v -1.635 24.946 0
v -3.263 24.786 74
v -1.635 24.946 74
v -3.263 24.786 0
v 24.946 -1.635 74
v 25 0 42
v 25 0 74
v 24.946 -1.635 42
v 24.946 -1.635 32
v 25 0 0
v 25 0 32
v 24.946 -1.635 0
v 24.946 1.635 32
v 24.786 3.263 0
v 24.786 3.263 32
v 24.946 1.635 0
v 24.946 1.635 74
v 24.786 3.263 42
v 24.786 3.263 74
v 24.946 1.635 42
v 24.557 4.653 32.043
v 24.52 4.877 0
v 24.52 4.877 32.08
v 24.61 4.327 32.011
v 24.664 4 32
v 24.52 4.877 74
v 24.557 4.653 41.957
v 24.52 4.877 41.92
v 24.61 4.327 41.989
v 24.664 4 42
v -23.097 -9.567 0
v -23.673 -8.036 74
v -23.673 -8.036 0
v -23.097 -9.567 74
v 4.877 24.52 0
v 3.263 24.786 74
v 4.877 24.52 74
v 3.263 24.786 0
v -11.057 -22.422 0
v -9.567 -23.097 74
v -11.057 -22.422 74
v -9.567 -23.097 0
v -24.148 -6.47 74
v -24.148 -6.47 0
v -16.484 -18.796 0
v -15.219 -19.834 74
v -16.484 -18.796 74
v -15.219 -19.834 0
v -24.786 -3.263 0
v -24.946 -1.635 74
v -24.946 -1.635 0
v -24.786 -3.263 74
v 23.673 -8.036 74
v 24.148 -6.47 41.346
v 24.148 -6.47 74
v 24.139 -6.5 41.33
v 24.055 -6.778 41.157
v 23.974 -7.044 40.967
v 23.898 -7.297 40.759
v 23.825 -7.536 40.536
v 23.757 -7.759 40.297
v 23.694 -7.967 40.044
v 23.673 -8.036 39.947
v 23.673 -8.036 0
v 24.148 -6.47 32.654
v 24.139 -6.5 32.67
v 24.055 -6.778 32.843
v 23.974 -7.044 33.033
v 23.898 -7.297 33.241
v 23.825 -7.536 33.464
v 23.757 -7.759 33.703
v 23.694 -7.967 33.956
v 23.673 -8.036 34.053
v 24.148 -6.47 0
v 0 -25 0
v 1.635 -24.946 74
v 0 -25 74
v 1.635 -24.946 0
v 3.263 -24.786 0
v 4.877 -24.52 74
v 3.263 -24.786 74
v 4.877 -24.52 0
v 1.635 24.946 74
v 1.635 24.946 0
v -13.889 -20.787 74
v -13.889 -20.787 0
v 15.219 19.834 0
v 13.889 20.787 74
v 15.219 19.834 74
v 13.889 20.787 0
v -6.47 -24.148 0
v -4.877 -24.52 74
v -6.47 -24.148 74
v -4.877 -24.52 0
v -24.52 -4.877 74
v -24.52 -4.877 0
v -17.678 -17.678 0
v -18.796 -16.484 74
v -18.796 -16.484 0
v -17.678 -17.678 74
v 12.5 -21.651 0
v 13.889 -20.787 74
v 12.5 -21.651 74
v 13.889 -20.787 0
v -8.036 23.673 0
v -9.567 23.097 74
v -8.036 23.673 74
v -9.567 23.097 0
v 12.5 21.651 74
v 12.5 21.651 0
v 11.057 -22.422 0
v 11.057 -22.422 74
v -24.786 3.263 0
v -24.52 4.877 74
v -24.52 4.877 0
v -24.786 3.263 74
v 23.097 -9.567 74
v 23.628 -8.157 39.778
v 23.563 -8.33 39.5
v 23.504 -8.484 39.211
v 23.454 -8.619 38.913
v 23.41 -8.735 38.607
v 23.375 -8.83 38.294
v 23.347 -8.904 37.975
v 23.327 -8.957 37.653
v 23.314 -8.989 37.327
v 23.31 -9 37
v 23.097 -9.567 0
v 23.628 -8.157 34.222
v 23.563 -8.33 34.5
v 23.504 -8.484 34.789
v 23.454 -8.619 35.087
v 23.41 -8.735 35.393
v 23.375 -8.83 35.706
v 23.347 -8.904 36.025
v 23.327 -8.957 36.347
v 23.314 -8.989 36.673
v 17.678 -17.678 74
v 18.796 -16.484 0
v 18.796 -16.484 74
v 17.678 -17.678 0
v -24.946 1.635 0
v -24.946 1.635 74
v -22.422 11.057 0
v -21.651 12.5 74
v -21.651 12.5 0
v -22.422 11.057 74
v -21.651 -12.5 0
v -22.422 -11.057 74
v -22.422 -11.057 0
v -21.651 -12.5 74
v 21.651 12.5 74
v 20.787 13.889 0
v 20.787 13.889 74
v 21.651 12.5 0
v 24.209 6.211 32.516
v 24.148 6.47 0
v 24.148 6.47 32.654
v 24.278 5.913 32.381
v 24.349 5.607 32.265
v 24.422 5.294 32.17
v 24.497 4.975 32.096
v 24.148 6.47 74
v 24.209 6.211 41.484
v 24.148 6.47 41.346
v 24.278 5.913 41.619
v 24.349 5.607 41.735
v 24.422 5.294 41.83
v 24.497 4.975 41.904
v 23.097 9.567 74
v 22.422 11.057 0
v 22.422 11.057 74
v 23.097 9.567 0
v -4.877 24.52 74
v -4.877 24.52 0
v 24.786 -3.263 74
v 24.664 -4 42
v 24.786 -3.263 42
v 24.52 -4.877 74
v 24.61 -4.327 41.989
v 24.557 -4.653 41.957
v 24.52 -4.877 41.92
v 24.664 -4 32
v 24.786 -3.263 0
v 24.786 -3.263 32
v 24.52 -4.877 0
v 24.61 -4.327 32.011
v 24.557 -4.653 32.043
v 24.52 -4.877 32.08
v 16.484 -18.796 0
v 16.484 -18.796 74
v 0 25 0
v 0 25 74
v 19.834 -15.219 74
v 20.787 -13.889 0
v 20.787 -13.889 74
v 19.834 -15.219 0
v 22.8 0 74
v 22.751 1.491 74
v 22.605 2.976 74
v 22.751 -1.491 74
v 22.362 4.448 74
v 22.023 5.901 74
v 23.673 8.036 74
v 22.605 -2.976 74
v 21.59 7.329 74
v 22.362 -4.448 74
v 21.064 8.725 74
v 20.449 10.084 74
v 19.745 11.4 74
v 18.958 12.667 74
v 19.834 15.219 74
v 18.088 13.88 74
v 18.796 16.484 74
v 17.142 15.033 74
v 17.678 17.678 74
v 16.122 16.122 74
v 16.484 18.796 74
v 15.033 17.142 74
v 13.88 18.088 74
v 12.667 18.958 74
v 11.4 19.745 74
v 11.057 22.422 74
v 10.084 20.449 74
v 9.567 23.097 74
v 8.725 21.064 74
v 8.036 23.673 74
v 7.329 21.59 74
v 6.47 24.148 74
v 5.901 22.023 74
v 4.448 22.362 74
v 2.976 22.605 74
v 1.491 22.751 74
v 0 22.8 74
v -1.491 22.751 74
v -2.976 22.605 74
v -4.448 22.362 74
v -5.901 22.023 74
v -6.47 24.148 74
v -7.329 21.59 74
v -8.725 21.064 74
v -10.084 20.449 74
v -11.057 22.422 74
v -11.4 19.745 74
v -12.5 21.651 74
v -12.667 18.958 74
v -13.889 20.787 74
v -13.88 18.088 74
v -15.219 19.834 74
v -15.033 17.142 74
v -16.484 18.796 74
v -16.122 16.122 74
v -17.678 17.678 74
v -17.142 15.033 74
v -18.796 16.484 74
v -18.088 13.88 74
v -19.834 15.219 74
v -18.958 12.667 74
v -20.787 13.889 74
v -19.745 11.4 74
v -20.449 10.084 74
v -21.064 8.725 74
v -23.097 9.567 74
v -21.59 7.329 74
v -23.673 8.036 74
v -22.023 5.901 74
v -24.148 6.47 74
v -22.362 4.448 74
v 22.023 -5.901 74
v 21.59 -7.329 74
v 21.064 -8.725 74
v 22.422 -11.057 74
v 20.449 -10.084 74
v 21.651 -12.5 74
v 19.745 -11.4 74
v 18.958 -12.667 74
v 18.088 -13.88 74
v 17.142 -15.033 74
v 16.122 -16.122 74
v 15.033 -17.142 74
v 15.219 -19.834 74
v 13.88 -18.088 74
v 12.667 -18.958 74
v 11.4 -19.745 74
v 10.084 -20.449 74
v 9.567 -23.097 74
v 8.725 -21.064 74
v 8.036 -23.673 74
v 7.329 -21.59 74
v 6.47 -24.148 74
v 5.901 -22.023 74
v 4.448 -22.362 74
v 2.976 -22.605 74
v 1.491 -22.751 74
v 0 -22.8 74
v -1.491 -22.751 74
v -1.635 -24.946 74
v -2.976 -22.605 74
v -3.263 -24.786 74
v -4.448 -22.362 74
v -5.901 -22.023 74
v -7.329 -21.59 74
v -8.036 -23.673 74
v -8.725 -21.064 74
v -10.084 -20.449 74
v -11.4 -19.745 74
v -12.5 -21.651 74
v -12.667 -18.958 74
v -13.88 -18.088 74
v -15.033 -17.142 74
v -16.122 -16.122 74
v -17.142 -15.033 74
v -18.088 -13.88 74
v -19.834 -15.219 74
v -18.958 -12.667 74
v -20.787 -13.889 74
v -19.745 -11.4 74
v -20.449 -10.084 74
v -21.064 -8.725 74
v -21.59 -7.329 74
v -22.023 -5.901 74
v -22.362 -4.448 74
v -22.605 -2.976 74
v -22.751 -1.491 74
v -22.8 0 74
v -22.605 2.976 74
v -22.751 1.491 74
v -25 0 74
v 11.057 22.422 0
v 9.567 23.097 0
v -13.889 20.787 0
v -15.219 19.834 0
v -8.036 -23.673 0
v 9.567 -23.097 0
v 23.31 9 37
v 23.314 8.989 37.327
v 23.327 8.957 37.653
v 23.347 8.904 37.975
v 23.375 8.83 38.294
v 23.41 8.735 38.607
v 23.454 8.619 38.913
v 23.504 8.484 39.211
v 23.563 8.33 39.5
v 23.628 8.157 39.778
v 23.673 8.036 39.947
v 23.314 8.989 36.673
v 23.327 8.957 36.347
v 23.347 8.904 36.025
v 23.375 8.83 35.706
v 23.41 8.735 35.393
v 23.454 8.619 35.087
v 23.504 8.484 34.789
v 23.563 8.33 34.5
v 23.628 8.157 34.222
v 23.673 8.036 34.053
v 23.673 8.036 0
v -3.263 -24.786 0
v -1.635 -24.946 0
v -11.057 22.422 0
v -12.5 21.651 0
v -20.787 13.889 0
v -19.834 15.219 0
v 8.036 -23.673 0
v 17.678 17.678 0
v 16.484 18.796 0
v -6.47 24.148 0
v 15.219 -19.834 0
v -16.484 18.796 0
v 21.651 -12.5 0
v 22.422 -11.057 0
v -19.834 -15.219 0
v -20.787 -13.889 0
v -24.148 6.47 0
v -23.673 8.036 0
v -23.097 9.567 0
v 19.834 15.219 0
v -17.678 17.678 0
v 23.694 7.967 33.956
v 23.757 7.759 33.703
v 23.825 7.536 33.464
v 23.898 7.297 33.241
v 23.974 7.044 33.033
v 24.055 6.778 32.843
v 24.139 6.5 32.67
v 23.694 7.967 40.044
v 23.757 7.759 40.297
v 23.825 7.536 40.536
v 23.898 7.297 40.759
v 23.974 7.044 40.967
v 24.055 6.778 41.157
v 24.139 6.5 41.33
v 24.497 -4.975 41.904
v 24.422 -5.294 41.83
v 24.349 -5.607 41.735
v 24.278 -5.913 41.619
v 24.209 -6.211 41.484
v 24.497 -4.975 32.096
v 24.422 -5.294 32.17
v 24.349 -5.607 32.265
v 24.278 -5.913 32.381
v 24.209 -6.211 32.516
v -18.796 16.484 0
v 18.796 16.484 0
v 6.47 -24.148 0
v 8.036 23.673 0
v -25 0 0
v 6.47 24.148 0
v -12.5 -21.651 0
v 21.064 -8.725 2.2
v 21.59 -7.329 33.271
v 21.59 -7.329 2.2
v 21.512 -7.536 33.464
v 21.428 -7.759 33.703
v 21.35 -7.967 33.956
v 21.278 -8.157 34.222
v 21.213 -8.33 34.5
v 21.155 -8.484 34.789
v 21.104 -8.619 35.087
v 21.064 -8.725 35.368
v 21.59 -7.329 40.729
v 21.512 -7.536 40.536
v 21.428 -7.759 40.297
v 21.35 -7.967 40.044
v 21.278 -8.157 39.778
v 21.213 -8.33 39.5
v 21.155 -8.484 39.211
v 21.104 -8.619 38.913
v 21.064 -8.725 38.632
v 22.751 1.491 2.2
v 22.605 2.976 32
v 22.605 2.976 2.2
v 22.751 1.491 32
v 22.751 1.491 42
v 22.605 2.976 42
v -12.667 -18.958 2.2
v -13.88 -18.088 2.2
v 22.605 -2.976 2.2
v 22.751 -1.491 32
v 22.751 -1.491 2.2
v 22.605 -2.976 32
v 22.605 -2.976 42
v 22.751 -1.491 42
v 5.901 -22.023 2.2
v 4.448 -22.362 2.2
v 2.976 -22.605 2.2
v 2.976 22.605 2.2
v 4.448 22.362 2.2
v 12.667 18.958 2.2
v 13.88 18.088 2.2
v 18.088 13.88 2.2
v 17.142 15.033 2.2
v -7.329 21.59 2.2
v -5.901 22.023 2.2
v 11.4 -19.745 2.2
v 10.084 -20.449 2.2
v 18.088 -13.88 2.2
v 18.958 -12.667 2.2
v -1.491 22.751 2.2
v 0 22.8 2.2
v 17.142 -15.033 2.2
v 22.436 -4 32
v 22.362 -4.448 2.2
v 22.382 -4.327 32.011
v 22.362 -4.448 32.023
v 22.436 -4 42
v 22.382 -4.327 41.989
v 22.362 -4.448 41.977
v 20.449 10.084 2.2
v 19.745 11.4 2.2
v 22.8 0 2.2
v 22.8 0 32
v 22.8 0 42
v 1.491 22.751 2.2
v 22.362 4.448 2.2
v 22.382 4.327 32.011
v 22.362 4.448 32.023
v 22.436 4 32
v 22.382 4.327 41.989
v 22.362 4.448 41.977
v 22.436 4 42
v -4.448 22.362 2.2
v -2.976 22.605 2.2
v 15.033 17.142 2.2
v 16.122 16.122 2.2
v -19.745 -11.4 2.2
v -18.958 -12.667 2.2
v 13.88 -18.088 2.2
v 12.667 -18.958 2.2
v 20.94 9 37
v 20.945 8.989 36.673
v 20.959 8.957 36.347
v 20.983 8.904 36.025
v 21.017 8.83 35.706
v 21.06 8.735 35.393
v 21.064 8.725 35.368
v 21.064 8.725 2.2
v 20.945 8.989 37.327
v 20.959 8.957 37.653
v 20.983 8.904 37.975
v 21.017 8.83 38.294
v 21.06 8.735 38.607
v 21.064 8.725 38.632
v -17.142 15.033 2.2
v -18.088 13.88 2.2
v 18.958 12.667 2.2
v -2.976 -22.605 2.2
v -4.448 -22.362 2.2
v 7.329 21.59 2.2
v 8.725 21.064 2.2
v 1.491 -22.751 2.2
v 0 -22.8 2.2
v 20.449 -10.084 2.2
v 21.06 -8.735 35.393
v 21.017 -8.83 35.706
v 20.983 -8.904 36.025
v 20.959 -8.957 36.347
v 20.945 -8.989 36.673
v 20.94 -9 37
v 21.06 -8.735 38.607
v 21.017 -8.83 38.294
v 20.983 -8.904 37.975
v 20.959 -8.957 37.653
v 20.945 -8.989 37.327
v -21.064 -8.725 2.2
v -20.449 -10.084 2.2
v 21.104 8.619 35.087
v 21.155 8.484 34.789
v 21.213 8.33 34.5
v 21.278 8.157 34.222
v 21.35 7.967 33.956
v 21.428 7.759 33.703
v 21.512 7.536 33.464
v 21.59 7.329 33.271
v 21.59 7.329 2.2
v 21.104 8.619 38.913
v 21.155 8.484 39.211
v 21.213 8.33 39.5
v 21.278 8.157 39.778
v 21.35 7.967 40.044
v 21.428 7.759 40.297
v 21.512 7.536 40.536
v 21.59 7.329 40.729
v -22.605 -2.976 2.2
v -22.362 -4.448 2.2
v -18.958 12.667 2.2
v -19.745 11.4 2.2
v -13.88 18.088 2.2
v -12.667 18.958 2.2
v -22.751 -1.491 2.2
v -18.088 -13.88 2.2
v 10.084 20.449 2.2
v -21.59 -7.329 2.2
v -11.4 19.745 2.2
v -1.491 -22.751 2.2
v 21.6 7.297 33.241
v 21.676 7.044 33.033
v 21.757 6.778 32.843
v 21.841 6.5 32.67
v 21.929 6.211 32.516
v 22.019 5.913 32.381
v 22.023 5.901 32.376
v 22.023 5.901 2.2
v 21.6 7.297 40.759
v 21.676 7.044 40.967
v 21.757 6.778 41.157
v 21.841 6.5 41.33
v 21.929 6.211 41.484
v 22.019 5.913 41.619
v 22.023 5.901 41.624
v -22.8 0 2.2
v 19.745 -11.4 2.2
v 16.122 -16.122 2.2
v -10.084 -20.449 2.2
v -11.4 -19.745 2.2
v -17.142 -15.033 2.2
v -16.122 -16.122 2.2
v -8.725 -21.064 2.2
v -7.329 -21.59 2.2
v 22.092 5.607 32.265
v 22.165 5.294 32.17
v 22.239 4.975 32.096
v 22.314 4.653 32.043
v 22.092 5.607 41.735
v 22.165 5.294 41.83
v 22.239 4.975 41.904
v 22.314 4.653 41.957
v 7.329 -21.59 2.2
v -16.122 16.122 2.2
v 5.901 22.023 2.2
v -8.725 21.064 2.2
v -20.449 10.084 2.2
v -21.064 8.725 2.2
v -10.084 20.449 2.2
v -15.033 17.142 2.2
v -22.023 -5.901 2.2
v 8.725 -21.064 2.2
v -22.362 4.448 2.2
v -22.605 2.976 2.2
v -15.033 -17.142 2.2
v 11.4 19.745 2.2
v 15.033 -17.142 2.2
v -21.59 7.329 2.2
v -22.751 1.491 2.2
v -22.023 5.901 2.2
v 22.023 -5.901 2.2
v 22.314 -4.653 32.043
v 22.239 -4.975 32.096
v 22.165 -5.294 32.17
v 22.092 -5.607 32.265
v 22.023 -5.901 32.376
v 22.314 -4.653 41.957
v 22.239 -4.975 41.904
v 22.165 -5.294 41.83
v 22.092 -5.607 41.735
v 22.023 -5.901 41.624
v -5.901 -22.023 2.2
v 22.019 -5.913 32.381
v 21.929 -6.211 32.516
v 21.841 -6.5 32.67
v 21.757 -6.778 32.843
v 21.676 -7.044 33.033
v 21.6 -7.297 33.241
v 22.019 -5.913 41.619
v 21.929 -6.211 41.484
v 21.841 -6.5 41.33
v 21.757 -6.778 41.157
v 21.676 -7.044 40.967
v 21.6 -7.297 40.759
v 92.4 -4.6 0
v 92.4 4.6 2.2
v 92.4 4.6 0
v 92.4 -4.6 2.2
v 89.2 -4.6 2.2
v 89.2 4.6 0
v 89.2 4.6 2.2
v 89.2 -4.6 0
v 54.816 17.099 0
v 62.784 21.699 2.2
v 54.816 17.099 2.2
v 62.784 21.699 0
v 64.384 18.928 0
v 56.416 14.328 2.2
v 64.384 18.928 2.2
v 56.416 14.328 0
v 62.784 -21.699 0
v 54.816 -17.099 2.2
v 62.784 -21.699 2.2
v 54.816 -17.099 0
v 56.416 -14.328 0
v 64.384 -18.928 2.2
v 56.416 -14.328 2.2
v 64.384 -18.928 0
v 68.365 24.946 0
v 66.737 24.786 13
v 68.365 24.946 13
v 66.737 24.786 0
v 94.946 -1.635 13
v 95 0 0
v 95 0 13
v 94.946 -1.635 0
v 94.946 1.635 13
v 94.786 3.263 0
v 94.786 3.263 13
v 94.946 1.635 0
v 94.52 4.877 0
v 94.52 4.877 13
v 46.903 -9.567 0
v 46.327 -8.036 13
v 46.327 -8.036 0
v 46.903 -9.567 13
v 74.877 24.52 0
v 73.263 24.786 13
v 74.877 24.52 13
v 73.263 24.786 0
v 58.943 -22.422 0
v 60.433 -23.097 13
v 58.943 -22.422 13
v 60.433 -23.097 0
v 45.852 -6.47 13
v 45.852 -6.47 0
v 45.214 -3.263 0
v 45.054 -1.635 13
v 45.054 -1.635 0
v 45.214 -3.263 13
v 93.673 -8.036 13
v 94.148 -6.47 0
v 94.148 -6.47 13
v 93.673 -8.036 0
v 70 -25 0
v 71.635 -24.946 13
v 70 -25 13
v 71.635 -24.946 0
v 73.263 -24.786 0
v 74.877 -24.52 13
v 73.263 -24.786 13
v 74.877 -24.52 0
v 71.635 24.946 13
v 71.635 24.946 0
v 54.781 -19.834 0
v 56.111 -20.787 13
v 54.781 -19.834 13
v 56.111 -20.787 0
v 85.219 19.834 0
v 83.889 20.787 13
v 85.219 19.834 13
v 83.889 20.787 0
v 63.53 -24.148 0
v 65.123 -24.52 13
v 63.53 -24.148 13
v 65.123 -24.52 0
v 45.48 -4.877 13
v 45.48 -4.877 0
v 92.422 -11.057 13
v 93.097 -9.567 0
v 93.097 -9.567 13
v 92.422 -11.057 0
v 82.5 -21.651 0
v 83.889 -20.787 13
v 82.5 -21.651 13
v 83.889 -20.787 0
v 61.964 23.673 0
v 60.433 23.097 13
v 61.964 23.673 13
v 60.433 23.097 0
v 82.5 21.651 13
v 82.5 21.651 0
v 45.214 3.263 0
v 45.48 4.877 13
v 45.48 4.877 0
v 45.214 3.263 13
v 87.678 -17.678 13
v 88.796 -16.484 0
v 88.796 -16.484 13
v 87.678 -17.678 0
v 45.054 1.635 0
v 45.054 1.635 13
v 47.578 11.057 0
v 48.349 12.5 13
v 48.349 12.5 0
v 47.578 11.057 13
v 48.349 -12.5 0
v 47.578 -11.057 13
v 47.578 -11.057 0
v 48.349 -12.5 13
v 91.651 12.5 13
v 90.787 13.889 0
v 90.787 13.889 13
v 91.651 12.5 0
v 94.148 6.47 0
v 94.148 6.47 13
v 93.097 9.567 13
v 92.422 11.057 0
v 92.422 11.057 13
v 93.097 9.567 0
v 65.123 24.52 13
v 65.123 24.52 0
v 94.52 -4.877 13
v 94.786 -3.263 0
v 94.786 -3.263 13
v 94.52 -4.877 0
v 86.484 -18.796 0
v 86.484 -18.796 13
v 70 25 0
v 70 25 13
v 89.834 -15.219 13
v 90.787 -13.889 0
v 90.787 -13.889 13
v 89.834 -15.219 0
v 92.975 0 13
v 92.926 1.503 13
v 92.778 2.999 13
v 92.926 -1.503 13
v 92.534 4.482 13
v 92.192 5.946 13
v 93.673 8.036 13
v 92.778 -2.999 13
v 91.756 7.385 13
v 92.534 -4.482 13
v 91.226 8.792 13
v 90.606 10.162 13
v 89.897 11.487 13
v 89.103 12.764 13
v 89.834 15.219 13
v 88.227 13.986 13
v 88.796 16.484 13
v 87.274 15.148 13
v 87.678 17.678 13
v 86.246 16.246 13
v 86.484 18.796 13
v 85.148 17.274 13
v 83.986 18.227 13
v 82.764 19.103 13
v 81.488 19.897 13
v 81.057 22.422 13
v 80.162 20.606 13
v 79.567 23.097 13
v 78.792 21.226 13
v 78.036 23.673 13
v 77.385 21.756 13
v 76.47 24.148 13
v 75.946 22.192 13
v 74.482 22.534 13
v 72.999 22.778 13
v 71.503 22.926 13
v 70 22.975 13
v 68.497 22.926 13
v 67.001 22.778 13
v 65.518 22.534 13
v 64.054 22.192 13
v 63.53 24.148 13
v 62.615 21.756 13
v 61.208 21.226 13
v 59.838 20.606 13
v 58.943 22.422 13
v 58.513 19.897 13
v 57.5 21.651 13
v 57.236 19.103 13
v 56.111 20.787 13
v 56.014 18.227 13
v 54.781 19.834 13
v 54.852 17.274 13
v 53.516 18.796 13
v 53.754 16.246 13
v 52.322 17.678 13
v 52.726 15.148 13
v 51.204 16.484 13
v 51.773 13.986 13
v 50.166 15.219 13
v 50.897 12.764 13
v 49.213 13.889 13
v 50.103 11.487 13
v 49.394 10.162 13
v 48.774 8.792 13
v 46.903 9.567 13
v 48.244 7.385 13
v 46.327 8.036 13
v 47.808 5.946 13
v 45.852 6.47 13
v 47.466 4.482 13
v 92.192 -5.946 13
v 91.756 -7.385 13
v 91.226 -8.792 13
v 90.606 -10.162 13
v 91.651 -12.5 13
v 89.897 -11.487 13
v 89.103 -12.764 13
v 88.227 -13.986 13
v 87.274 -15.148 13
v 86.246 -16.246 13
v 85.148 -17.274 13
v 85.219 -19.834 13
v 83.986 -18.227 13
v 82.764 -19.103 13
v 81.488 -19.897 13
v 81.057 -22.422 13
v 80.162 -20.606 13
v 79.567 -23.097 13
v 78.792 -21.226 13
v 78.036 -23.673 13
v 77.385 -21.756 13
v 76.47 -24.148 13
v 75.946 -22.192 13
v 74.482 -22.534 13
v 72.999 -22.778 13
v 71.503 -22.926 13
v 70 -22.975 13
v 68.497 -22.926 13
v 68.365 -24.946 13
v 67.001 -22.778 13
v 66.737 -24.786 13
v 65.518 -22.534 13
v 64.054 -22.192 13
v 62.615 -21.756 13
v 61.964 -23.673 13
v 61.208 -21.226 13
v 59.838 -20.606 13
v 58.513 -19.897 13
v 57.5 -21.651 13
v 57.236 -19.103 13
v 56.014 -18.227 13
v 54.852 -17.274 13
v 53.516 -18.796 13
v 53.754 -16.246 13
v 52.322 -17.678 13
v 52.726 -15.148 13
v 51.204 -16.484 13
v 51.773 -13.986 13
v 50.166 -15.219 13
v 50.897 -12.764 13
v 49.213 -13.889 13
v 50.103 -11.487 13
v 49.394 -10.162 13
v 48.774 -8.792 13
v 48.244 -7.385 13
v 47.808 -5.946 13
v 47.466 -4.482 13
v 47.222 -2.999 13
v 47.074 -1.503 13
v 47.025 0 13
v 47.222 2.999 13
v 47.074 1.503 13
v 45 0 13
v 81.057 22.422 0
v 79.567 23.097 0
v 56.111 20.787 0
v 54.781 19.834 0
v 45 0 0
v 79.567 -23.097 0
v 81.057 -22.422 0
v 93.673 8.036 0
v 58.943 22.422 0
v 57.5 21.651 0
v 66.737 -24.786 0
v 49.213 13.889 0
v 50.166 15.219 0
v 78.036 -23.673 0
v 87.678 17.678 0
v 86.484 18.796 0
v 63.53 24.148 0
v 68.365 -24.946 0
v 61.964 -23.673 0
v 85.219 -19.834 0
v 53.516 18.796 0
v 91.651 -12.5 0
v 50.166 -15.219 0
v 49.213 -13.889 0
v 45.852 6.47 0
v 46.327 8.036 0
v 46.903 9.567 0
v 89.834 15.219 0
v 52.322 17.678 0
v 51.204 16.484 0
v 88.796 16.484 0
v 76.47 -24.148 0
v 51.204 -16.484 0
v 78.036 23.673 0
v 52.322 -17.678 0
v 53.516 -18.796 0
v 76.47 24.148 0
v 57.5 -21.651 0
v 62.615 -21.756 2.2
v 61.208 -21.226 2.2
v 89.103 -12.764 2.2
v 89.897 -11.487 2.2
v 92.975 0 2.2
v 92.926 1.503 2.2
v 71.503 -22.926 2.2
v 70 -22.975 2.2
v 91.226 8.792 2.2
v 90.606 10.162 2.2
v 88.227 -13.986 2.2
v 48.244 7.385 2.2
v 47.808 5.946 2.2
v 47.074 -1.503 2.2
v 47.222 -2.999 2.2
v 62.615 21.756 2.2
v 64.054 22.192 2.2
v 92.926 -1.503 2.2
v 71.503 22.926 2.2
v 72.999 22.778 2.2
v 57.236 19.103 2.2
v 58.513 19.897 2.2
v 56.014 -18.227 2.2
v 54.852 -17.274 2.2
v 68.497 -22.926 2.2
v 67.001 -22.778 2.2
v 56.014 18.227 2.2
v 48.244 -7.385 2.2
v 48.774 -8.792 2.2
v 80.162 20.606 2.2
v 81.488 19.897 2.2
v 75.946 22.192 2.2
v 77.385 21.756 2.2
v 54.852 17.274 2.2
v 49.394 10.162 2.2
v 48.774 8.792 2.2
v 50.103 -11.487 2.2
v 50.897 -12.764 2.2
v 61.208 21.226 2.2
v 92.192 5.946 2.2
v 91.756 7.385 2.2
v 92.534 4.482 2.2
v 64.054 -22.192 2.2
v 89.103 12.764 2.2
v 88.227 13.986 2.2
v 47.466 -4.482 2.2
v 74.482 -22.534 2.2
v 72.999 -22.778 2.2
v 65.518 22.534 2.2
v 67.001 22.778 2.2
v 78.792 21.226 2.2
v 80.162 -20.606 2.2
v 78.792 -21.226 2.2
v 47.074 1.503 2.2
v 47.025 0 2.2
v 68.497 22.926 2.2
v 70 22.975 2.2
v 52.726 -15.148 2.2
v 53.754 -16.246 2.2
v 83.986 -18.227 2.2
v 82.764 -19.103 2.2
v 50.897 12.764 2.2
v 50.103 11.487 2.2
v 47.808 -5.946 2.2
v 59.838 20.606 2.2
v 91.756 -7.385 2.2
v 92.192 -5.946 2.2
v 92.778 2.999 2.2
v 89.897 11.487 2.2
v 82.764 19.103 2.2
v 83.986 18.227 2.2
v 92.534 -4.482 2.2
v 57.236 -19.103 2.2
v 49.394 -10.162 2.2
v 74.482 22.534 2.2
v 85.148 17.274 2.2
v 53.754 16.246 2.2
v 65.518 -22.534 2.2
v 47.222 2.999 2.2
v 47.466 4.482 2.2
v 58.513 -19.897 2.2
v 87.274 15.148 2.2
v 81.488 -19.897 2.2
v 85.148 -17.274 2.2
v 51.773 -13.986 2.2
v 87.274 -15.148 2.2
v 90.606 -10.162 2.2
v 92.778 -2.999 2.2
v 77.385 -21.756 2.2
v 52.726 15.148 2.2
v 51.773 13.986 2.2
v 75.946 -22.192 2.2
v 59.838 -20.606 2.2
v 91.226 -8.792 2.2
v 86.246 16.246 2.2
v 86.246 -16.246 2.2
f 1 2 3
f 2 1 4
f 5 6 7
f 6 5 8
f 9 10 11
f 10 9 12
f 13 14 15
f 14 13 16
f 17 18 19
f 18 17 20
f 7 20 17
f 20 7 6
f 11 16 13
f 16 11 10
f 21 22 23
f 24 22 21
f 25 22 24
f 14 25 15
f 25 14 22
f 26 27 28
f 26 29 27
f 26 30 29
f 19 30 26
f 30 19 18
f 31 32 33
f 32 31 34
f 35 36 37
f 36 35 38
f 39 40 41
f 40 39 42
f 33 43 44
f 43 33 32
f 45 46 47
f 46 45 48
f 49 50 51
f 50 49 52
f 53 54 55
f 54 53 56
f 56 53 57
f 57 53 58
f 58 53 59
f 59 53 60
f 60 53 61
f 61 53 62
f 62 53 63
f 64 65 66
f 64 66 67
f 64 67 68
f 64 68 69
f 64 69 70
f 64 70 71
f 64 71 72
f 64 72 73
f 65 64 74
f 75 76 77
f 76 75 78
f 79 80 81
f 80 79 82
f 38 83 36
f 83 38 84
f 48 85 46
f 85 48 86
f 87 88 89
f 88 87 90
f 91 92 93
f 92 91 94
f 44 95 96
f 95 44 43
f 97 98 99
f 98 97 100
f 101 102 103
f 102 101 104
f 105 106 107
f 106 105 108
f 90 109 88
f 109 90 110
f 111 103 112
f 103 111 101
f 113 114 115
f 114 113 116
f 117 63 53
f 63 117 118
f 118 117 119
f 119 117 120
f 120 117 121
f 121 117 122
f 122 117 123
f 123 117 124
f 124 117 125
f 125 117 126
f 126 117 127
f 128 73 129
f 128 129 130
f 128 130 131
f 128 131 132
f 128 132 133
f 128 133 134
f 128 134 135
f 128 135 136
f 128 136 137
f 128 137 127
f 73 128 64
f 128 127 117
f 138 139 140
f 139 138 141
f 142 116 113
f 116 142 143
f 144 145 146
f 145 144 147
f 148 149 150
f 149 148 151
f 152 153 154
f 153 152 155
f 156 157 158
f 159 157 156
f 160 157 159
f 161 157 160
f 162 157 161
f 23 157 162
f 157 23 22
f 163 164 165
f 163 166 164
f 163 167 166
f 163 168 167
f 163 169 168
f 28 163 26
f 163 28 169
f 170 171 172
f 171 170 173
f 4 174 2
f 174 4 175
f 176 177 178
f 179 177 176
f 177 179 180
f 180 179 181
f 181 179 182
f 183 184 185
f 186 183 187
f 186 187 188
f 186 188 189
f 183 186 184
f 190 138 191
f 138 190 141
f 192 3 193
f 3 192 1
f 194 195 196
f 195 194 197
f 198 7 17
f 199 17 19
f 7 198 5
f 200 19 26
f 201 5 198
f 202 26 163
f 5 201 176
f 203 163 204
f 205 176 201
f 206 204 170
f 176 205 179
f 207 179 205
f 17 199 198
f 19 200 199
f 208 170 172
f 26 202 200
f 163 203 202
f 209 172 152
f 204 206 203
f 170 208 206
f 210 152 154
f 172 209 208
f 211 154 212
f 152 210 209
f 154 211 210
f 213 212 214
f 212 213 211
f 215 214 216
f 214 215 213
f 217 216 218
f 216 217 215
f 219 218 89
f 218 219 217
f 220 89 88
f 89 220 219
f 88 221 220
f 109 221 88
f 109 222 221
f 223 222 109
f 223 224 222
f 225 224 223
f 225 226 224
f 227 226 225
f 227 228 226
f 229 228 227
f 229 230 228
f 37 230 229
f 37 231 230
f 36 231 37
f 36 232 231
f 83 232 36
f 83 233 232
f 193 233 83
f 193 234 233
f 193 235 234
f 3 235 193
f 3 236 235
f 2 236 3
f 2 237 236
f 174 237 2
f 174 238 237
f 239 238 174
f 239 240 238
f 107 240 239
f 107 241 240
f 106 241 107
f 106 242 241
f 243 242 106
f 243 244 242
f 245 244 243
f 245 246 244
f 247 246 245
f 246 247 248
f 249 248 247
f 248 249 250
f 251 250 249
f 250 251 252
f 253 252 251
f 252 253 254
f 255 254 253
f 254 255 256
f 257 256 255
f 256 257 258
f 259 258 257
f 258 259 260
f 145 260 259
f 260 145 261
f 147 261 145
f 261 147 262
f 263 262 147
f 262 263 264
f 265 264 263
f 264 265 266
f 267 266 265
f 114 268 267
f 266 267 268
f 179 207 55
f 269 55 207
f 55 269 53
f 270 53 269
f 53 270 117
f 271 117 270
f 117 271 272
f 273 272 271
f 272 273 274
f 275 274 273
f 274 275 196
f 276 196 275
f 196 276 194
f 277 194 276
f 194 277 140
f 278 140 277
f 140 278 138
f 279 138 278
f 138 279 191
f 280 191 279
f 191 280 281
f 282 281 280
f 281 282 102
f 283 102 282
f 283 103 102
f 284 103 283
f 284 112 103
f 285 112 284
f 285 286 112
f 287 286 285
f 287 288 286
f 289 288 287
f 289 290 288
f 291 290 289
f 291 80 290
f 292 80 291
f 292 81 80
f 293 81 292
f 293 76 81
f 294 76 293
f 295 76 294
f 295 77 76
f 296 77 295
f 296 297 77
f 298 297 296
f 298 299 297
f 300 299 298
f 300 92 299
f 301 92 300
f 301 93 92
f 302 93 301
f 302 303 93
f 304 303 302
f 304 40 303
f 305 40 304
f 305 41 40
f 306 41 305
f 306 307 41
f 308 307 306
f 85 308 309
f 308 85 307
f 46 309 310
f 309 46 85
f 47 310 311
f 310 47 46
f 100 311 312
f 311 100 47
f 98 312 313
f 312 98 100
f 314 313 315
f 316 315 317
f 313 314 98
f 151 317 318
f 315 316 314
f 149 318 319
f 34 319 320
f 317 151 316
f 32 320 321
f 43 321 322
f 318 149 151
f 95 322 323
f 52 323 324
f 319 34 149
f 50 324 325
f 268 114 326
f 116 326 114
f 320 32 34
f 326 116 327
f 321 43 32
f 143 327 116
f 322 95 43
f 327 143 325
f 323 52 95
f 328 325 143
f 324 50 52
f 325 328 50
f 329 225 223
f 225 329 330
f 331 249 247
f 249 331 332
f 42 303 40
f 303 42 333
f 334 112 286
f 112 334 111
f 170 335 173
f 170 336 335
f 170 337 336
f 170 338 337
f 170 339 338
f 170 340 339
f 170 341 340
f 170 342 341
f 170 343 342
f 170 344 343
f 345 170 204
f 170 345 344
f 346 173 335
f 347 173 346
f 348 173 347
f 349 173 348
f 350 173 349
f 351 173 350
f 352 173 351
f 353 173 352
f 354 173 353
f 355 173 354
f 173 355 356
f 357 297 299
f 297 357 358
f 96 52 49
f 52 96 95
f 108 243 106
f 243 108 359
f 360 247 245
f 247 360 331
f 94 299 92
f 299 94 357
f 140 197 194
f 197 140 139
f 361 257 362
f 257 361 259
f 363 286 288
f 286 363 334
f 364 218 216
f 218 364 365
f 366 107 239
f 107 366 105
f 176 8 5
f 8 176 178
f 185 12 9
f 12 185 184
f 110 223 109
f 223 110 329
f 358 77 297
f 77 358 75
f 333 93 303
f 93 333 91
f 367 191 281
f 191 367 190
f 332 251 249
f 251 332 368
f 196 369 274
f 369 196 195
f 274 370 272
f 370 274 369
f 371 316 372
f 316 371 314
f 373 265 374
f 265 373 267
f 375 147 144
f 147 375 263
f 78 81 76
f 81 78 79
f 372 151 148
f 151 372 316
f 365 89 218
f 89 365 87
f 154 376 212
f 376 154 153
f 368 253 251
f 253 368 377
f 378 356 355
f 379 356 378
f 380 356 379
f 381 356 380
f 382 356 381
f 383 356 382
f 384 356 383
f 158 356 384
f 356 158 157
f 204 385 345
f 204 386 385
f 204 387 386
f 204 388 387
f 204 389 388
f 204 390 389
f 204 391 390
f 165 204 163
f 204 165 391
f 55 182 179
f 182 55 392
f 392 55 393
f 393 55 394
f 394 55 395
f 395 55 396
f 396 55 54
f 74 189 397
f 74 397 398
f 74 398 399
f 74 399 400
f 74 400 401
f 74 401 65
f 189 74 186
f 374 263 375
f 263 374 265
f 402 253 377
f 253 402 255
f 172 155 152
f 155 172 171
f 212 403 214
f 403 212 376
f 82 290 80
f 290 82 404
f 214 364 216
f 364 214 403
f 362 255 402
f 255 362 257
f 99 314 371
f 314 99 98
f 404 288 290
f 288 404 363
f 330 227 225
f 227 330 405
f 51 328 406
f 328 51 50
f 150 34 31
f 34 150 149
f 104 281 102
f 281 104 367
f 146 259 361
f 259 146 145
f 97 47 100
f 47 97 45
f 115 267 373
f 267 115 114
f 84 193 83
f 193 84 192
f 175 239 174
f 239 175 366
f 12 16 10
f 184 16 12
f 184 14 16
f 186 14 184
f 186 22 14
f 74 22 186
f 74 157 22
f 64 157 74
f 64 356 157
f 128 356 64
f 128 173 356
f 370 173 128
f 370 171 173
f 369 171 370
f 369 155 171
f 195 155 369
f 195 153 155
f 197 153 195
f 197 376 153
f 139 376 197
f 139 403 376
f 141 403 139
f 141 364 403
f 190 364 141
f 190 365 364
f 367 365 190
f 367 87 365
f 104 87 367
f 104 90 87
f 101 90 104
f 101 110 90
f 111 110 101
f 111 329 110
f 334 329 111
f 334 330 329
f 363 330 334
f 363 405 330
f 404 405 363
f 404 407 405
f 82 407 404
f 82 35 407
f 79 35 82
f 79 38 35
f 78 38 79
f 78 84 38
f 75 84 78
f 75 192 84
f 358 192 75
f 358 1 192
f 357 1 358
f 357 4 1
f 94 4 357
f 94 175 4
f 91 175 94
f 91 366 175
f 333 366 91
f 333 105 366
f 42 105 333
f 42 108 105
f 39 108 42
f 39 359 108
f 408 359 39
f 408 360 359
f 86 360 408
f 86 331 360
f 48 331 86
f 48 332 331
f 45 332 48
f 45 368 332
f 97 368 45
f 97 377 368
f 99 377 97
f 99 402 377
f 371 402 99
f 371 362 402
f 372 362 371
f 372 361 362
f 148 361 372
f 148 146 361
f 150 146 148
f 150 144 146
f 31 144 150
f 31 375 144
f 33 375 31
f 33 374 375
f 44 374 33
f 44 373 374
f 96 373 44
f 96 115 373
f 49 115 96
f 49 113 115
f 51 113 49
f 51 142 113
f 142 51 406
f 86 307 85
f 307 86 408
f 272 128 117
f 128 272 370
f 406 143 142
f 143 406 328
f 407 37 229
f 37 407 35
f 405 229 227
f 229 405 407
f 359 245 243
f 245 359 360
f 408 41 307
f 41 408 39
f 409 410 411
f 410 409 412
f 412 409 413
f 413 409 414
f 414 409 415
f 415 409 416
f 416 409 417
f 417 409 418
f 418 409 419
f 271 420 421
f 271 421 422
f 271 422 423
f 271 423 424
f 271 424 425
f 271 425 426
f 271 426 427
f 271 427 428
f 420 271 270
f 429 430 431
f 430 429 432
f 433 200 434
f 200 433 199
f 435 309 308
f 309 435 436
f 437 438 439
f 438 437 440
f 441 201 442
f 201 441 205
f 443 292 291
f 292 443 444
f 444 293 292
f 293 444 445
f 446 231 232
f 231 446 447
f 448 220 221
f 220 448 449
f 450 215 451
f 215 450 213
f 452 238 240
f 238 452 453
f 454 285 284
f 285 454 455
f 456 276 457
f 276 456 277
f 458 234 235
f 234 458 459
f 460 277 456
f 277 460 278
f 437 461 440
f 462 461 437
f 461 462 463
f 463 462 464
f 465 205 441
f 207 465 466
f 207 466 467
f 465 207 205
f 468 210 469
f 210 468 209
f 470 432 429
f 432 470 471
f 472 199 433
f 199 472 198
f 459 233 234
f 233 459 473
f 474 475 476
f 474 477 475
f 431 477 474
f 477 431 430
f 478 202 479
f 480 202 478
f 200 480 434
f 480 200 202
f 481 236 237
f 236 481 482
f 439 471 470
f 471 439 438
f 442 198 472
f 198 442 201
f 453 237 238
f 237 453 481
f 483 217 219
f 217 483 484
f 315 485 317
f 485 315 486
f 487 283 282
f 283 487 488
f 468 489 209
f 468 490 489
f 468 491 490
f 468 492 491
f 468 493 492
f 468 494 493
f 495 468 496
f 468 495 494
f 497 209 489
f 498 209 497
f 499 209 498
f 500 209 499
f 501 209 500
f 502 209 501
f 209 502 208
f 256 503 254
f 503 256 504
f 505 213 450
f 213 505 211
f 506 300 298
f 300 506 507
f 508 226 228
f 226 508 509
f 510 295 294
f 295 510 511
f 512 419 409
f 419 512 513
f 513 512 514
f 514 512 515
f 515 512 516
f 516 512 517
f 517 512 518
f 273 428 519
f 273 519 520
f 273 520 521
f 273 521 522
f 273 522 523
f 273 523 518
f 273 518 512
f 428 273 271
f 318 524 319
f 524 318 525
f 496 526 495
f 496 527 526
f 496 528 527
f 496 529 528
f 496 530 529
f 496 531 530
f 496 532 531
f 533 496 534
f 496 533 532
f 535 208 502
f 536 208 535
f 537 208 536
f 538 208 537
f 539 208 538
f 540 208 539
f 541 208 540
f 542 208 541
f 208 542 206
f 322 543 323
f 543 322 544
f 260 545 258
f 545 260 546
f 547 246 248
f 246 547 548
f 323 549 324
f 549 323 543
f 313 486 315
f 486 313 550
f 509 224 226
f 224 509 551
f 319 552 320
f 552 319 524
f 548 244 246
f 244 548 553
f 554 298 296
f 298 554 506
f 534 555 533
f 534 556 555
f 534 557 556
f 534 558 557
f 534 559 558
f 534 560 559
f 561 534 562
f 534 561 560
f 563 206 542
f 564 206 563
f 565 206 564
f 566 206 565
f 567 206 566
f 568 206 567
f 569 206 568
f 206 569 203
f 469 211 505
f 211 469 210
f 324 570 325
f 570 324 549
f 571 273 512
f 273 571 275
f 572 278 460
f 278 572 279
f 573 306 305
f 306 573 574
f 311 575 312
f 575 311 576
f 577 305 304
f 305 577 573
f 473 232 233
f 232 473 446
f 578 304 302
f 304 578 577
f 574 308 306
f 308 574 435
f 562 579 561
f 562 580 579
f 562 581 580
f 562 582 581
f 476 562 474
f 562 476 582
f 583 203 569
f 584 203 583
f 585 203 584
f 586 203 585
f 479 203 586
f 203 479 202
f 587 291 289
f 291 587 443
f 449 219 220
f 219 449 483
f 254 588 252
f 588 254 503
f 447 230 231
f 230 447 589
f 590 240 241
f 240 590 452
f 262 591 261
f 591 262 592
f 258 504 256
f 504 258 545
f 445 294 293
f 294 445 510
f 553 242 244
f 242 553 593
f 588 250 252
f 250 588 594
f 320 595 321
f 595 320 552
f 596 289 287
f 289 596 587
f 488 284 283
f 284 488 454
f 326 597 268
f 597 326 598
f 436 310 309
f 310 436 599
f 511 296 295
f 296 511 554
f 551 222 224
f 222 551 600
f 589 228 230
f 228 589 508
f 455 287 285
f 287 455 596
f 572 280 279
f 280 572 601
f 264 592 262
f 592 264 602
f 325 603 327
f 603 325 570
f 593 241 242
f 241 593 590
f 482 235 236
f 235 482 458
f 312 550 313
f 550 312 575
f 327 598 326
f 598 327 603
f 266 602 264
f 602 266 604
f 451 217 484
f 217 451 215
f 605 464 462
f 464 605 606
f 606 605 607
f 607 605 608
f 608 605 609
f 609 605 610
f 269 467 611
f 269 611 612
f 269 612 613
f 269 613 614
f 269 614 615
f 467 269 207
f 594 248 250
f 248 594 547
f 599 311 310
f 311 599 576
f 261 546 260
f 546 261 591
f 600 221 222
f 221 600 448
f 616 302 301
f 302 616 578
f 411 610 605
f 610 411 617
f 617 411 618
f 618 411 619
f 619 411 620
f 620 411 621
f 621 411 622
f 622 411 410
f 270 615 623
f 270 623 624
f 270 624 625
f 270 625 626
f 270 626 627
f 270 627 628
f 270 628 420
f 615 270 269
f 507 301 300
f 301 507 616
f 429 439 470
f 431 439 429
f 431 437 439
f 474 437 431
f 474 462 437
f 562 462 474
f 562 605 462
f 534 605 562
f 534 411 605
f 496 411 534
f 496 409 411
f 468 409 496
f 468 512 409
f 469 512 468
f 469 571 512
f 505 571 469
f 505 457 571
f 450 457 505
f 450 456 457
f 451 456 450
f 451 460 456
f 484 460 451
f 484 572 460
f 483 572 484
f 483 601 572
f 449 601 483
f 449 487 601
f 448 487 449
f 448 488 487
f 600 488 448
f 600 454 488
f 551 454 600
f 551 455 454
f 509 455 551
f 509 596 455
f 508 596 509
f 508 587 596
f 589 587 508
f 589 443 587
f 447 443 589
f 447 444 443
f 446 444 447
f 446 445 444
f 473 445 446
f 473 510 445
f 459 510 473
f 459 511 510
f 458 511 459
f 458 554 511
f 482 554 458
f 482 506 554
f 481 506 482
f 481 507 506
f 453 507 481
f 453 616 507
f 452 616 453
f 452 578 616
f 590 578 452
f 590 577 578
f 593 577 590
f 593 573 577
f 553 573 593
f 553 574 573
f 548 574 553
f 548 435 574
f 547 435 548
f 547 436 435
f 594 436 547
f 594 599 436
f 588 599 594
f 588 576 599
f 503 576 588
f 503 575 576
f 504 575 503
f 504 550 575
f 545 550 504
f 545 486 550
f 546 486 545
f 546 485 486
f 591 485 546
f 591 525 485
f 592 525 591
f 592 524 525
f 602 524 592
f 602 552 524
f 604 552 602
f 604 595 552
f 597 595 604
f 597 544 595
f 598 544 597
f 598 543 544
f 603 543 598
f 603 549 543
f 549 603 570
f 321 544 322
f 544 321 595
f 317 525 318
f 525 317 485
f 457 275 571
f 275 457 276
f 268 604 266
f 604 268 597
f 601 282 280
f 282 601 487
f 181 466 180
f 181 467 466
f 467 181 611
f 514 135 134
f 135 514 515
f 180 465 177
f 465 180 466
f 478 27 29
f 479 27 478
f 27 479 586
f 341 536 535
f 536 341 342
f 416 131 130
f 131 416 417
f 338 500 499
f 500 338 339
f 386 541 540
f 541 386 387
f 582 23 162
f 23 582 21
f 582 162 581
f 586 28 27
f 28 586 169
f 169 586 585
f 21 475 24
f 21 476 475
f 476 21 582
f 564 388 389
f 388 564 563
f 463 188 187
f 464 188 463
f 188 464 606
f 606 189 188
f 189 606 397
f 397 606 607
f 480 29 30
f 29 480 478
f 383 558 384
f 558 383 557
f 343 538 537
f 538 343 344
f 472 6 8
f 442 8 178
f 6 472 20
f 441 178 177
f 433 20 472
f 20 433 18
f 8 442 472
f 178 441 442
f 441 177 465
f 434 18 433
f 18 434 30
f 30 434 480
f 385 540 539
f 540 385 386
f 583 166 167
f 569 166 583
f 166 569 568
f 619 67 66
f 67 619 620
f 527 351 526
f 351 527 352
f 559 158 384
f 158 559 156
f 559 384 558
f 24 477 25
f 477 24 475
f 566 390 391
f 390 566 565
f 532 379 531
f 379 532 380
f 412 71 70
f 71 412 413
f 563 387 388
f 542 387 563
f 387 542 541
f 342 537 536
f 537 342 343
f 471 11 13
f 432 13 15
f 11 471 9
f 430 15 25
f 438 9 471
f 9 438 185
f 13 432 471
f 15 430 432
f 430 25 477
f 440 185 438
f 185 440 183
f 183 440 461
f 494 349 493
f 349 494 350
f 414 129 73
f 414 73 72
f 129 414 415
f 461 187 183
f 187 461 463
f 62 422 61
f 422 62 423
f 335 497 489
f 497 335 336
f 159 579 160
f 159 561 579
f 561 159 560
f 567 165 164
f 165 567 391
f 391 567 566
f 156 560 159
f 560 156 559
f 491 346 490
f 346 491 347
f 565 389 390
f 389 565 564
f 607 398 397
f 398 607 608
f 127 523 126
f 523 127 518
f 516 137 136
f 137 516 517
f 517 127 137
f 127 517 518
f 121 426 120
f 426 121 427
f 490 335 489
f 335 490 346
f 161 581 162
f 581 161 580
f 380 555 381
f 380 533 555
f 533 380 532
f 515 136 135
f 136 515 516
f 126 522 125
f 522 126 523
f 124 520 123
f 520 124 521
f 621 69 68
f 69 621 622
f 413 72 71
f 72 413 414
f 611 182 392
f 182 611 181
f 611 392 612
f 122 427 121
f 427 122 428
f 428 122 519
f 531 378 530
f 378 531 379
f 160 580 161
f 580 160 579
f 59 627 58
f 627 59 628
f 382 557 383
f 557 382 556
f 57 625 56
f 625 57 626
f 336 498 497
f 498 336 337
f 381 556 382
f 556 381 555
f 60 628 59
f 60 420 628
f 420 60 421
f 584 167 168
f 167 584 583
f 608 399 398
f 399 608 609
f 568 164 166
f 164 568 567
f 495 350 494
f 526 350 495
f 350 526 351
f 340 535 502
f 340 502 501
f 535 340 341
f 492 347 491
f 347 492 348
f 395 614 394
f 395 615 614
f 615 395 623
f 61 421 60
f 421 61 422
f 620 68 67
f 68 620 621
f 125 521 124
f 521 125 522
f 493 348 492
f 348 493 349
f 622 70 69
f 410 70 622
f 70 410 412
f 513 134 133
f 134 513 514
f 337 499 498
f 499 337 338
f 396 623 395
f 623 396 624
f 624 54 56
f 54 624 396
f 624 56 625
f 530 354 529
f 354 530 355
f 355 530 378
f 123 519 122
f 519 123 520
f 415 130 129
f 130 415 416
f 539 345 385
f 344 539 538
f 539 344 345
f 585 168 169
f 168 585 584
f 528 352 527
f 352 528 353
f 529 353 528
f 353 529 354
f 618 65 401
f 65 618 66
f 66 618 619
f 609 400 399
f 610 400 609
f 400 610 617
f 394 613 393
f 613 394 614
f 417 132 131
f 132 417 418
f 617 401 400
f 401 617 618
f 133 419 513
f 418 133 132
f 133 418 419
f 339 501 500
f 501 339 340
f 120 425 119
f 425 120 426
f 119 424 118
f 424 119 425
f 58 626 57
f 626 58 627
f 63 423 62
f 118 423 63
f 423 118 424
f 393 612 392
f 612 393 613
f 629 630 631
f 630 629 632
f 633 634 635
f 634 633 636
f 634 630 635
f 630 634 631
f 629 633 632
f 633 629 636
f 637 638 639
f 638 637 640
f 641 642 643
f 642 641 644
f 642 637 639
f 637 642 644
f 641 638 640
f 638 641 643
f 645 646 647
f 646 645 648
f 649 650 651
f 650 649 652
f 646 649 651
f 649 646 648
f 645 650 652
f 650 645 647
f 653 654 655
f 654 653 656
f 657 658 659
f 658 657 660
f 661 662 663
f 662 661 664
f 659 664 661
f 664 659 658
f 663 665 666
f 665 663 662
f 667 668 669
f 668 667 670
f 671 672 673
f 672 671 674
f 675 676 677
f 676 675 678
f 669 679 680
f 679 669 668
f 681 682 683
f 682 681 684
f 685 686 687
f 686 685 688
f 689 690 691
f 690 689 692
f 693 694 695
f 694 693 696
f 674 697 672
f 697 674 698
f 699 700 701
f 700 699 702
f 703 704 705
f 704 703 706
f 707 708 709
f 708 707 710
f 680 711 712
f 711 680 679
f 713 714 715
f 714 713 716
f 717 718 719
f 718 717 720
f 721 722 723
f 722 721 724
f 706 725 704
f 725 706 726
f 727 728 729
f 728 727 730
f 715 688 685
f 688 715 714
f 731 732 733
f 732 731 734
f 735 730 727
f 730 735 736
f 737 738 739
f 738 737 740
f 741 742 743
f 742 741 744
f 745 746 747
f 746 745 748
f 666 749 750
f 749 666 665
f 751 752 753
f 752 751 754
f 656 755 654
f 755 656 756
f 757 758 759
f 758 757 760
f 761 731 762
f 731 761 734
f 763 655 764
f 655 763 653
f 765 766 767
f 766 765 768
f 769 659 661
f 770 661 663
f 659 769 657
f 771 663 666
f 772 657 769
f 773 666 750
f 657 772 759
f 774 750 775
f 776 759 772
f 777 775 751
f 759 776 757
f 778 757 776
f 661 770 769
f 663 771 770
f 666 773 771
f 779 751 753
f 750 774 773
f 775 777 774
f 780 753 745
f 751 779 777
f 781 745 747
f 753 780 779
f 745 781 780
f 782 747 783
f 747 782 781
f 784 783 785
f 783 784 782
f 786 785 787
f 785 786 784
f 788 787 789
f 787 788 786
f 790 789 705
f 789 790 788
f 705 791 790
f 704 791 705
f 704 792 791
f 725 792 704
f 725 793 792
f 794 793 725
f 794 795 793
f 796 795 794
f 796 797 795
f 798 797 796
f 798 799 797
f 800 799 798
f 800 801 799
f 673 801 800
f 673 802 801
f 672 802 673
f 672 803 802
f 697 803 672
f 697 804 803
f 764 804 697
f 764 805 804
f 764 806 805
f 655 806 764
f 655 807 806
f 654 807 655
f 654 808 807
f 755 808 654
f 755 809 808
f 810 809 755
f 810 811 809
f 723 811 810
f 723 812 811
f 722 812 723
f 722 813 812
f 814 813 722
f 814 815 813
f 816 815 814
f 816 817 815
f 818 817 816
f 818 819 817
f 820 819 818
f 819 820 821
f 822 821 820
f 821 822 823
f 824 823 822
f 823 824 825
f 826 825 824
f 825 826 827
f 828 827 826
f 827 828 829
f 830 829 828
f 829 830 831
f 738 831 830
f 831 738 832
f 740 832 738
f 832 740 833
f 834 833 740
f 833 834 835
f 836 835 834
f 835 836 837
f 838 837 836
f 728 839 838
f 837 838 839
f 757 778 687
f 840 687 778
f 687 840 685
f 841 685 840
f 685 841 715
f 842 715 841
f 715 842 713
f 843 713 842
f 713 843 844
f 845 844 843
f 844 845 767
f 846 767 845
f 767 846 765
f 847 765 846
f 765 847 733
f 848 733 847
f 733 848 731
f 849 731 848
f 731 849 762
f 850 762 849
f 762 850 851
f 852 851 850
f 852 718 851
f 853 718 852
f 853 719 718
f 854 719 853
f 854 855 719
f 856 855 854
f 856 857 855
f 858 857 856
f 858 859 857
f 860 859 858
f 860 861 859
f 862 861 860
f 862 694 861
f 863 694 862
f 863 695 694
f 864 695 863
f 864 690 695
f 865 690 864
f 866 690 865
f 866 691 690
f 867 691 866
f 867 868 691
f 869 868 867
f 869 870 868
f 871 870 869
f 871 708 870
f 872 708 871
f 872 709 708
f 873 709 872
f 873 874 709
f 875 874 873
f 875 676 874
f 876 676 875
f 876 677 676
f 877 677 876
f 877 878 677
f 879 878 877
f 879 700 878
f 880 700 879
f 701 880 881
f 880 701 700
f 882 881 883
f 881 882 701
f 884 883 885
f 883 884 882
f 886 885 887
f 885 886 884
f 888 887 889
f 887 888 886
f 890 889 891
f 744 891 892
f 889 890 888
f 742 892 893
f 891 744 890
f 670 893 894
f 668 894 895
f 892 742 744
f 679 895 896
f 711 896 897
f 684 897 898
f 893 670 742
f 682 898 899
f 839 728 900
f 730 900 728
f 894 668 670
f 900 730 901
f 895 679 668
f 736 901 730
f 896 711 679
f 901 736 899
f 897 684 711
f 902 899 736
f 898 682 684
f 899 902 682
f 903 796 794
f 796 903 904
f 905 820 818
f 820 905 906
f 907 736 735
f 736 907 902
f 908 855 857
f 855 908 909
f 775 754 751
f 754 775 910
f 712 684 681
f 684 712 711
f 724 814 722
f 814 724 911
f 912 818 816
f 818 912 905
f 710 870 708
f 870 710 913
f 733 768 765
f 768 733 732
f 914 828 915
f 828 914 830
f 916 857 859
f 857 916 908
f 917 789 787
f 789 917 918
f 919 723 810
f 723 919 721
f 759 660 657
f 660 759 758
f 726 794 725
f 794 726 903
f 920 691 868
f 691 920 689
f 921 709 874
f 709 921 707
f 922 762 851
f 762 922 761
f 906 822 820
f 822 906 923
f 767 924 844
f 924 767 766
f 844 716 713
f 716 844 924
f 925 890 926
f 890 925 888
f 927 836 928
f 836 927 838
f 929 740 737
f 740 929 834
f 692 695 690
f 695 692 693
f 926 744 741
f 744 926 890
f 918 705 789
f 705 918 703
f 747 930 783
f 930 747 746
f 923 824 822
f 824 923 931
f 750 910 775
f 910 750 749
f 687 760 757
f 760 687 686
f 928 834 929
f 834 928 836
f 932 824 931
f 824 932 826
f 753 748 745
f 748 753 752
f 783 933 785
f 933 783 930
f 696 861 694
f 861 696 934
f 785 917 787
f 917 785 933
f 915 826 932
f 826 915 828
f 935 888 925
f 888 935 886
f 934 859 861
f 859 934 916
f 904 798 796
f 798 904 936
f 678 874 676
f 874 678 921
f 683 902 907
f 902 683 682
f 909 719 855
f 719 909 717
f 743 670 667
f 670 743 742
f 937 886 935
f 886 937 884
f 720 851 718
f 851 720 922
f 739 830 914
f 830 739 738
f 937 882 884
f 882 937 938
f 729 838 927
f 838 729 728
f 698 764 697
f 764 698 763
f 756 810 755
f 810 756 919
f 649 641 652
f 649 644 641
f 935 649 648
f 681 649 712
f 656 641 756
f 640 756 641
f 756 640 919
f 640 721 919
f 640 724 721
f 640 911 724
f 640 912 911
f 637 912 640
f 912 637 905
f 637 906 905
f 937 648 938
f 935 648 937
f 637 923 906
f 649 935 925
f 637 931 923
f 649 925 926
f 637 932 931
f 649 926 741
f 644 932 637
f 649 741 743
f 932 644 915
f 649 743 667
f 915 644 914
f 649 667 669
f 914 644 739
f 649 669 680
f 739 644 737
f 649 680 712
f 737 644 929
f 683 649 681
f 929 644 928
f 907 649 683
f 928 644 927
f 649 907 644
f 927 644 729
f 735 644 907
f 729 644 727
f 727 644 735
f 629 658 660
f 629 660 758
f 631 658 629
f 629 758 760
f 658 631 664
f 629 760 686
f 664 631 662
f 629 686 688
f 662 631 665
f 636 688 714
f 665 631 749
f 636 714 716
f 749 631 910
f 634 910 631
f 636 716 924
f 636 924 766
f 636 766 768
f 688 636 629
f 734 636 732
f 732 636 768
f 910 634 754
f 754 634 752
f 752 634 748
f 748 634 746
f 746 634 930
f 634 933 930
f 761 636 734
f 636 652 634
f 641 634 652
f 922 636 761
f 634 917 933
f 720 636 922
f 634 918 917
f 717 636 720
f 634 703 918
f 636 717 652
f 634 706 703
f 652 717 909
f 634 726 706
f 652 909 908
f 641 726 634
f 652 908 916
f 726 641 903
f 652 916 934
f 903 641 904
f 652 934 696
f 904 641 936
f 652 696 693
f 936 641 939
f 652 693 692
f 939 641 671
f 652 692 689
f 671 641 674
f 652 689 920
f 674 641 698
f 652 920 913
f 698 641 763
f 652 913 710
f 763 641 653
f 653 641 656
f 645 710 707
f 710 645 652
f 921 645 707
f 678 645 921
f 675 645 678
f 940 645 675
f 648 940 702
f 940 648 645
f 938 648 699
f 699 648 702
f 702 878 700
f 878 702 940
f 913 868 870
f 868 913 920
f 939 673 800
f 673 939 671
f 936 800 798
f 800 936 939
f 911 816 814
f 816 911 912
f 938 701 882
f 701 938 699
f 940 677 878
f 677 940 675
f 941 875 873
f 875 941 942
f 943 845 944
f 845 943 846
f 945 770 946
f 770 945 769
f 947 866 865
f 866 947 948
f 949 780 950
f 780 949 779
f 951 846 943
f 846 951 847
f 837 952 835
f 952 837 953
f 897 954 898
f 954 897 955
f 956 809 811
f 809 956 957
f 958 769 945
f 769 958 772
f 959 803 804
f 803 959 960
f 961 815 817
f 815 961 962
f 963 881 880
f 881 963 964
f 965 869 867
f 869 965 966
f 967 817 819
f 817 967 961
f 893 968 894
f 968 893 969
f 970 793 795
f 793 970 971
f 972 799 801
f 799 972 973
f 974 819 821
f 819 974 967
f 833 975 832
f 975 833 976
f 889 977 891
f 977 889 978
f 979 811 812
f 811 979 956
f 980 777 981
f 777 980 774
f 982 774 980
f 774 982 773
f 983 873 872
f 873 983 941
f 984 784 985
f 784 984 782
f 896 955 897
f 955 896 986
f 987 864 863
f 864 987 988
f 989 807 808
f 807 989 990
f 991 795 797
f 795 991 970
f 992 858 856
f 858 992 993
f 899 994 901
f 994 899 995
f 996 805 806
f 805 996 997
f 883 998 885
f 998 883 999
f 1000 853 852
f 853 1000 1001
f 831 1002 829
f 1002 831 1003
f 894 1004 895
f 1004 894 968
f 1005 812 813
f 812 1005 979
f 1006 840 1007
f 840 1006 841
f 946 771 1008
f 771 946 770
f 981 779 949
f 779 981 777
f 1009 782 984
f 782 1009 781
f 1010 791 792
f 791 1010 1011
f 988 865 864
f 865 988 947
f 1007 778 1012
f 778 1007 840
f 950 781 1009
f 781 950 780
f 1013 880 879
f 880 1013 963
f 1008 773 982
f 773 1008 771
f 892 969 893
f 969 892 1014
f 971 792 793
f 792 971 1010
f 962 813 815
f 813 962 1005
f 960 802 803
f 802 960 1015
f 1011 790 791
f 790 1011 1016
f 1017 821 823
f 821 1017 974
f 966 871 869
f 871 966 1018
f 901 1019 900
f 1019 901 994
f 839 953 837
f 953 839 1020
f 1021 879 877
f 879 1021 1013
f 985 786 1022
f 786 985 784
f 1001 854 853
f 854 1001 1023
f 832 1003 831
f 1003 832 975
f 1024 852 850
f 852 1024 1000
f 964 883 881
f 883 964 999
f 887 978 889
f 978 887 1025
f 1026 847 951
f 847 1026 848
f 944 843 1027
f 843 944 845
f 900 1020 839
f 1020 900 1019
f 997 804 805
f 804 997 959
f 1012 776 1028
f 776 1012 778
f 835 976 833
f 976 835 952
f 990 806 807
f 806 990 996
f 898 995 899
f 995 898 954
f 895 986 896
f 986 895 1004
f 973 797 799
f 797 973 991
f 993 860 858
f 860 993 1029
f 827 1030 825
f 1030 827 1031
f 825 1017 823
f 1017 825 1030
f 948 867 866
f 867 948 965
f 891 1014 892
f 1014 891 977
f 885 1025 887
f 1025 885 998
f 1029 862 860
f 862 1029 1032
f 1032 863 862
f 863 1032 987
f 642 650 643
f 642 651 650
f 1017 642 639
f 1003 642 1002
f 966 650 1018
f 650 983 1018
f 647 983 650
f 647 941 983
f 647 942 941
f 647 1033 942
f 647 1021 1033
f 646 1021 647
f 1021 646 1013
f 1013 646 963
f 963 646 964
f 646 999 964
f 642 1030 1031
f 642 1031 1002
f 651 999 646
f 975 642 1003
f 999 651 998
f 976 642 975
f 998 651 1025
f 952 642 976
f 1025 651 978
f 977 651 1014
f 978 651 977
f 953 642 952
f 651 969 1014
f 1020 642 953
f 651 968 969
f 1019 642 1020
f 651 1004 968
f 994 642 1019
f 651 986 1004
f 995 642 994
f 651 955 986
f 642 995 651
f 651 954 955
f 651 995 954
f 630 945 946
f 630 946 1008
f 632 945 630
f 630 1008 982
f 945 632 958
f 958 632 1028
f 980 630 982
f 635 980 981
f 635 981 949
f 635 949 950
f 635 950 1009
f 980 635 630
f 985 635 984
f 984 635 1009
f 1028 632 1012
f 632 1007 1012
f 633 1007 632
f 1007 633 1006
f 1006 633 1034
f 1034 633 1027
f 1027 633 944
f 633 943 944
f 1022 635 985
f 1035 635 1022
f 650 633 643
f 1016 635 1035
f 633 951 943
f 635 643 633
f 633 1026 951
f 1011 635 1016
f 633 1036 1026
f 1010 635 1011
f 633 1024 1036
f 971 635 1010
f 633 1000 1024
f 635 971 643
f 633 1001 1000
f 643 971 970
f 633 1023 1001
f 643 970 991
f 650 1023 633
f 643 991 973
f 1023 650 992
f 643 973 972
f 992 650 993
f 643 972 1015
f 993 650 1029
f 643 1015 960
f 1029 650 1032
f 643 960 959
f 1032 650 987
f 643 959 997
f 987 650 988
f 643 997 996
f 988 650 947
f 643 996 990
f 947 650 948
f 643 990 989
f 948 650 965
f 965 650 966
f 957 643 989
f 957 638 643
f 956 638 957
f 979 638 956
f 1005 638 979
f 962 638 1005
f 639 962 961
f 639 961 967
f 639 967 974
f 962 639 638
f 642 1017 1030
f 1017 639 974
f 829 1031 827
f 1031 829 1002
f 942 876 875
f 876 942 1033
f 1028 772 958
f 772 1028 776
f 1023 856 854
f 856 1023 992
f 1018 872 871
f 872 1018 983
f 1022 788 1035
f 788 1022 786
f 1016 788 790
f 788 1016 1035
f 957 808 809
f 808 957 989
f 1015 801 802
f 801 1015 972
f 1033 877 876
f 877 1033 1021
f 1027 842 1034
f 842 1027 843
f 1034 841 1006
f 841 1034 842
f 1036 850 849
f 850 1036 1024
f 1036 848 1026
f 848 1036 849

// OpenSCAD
// TS-PET-B03 - Twist-Lock Waste Bag Pod
$fn = 96; outer_d = 50; body_h = 74; wall = 2.2; lid_h = 13; tab_w = 8; tab_t = 2.0; tab_h = 4.0; fit = 0.35; slot_w = 10; slot_h = 18; spacing = 70;
module bayonet_tabs() { for (a = [0,120,240]) rotate([0,0,a]) translate([outer_d/2 - wall - 2,0,body_h - lid_h]) cube([tab_t, tab_w, tab_h], center = true); }
module body() { difference() { union() { cylinder(h = body_h, d = outer_d); bayonet_tabs(); } translate([0,0,wall]) cylinder(h = body_h, d = outer_d - 2*wall); translate([outer_d/2 - wall/2, 0, body_h/2]) rotate([0,90,0]) linear_extrude(height = wall + 4, center = true) hull() { translate([0, slot_h/2 - slot_w/2]) circle(d = slot_w); translate([0,-slot_h/2 + slot_w/2]) circle(d = slot_w); } } }
module lid() { difference() { cylinder(h = lid_h, d = outer_d); translate([0,0,wall]) cylinder(h = lid_h, d = outer_d - 2*wall + fit); for (a = [0,120,240]) rotate([0,0,a]) translate([outer_d/2 - wall - 2,0,lid_h/2]) cube([tab_t + 1.2, tab_w + 1.2, lid_h + 2], center = true); } }
body(); translate([spacing,0,0]) lid();
